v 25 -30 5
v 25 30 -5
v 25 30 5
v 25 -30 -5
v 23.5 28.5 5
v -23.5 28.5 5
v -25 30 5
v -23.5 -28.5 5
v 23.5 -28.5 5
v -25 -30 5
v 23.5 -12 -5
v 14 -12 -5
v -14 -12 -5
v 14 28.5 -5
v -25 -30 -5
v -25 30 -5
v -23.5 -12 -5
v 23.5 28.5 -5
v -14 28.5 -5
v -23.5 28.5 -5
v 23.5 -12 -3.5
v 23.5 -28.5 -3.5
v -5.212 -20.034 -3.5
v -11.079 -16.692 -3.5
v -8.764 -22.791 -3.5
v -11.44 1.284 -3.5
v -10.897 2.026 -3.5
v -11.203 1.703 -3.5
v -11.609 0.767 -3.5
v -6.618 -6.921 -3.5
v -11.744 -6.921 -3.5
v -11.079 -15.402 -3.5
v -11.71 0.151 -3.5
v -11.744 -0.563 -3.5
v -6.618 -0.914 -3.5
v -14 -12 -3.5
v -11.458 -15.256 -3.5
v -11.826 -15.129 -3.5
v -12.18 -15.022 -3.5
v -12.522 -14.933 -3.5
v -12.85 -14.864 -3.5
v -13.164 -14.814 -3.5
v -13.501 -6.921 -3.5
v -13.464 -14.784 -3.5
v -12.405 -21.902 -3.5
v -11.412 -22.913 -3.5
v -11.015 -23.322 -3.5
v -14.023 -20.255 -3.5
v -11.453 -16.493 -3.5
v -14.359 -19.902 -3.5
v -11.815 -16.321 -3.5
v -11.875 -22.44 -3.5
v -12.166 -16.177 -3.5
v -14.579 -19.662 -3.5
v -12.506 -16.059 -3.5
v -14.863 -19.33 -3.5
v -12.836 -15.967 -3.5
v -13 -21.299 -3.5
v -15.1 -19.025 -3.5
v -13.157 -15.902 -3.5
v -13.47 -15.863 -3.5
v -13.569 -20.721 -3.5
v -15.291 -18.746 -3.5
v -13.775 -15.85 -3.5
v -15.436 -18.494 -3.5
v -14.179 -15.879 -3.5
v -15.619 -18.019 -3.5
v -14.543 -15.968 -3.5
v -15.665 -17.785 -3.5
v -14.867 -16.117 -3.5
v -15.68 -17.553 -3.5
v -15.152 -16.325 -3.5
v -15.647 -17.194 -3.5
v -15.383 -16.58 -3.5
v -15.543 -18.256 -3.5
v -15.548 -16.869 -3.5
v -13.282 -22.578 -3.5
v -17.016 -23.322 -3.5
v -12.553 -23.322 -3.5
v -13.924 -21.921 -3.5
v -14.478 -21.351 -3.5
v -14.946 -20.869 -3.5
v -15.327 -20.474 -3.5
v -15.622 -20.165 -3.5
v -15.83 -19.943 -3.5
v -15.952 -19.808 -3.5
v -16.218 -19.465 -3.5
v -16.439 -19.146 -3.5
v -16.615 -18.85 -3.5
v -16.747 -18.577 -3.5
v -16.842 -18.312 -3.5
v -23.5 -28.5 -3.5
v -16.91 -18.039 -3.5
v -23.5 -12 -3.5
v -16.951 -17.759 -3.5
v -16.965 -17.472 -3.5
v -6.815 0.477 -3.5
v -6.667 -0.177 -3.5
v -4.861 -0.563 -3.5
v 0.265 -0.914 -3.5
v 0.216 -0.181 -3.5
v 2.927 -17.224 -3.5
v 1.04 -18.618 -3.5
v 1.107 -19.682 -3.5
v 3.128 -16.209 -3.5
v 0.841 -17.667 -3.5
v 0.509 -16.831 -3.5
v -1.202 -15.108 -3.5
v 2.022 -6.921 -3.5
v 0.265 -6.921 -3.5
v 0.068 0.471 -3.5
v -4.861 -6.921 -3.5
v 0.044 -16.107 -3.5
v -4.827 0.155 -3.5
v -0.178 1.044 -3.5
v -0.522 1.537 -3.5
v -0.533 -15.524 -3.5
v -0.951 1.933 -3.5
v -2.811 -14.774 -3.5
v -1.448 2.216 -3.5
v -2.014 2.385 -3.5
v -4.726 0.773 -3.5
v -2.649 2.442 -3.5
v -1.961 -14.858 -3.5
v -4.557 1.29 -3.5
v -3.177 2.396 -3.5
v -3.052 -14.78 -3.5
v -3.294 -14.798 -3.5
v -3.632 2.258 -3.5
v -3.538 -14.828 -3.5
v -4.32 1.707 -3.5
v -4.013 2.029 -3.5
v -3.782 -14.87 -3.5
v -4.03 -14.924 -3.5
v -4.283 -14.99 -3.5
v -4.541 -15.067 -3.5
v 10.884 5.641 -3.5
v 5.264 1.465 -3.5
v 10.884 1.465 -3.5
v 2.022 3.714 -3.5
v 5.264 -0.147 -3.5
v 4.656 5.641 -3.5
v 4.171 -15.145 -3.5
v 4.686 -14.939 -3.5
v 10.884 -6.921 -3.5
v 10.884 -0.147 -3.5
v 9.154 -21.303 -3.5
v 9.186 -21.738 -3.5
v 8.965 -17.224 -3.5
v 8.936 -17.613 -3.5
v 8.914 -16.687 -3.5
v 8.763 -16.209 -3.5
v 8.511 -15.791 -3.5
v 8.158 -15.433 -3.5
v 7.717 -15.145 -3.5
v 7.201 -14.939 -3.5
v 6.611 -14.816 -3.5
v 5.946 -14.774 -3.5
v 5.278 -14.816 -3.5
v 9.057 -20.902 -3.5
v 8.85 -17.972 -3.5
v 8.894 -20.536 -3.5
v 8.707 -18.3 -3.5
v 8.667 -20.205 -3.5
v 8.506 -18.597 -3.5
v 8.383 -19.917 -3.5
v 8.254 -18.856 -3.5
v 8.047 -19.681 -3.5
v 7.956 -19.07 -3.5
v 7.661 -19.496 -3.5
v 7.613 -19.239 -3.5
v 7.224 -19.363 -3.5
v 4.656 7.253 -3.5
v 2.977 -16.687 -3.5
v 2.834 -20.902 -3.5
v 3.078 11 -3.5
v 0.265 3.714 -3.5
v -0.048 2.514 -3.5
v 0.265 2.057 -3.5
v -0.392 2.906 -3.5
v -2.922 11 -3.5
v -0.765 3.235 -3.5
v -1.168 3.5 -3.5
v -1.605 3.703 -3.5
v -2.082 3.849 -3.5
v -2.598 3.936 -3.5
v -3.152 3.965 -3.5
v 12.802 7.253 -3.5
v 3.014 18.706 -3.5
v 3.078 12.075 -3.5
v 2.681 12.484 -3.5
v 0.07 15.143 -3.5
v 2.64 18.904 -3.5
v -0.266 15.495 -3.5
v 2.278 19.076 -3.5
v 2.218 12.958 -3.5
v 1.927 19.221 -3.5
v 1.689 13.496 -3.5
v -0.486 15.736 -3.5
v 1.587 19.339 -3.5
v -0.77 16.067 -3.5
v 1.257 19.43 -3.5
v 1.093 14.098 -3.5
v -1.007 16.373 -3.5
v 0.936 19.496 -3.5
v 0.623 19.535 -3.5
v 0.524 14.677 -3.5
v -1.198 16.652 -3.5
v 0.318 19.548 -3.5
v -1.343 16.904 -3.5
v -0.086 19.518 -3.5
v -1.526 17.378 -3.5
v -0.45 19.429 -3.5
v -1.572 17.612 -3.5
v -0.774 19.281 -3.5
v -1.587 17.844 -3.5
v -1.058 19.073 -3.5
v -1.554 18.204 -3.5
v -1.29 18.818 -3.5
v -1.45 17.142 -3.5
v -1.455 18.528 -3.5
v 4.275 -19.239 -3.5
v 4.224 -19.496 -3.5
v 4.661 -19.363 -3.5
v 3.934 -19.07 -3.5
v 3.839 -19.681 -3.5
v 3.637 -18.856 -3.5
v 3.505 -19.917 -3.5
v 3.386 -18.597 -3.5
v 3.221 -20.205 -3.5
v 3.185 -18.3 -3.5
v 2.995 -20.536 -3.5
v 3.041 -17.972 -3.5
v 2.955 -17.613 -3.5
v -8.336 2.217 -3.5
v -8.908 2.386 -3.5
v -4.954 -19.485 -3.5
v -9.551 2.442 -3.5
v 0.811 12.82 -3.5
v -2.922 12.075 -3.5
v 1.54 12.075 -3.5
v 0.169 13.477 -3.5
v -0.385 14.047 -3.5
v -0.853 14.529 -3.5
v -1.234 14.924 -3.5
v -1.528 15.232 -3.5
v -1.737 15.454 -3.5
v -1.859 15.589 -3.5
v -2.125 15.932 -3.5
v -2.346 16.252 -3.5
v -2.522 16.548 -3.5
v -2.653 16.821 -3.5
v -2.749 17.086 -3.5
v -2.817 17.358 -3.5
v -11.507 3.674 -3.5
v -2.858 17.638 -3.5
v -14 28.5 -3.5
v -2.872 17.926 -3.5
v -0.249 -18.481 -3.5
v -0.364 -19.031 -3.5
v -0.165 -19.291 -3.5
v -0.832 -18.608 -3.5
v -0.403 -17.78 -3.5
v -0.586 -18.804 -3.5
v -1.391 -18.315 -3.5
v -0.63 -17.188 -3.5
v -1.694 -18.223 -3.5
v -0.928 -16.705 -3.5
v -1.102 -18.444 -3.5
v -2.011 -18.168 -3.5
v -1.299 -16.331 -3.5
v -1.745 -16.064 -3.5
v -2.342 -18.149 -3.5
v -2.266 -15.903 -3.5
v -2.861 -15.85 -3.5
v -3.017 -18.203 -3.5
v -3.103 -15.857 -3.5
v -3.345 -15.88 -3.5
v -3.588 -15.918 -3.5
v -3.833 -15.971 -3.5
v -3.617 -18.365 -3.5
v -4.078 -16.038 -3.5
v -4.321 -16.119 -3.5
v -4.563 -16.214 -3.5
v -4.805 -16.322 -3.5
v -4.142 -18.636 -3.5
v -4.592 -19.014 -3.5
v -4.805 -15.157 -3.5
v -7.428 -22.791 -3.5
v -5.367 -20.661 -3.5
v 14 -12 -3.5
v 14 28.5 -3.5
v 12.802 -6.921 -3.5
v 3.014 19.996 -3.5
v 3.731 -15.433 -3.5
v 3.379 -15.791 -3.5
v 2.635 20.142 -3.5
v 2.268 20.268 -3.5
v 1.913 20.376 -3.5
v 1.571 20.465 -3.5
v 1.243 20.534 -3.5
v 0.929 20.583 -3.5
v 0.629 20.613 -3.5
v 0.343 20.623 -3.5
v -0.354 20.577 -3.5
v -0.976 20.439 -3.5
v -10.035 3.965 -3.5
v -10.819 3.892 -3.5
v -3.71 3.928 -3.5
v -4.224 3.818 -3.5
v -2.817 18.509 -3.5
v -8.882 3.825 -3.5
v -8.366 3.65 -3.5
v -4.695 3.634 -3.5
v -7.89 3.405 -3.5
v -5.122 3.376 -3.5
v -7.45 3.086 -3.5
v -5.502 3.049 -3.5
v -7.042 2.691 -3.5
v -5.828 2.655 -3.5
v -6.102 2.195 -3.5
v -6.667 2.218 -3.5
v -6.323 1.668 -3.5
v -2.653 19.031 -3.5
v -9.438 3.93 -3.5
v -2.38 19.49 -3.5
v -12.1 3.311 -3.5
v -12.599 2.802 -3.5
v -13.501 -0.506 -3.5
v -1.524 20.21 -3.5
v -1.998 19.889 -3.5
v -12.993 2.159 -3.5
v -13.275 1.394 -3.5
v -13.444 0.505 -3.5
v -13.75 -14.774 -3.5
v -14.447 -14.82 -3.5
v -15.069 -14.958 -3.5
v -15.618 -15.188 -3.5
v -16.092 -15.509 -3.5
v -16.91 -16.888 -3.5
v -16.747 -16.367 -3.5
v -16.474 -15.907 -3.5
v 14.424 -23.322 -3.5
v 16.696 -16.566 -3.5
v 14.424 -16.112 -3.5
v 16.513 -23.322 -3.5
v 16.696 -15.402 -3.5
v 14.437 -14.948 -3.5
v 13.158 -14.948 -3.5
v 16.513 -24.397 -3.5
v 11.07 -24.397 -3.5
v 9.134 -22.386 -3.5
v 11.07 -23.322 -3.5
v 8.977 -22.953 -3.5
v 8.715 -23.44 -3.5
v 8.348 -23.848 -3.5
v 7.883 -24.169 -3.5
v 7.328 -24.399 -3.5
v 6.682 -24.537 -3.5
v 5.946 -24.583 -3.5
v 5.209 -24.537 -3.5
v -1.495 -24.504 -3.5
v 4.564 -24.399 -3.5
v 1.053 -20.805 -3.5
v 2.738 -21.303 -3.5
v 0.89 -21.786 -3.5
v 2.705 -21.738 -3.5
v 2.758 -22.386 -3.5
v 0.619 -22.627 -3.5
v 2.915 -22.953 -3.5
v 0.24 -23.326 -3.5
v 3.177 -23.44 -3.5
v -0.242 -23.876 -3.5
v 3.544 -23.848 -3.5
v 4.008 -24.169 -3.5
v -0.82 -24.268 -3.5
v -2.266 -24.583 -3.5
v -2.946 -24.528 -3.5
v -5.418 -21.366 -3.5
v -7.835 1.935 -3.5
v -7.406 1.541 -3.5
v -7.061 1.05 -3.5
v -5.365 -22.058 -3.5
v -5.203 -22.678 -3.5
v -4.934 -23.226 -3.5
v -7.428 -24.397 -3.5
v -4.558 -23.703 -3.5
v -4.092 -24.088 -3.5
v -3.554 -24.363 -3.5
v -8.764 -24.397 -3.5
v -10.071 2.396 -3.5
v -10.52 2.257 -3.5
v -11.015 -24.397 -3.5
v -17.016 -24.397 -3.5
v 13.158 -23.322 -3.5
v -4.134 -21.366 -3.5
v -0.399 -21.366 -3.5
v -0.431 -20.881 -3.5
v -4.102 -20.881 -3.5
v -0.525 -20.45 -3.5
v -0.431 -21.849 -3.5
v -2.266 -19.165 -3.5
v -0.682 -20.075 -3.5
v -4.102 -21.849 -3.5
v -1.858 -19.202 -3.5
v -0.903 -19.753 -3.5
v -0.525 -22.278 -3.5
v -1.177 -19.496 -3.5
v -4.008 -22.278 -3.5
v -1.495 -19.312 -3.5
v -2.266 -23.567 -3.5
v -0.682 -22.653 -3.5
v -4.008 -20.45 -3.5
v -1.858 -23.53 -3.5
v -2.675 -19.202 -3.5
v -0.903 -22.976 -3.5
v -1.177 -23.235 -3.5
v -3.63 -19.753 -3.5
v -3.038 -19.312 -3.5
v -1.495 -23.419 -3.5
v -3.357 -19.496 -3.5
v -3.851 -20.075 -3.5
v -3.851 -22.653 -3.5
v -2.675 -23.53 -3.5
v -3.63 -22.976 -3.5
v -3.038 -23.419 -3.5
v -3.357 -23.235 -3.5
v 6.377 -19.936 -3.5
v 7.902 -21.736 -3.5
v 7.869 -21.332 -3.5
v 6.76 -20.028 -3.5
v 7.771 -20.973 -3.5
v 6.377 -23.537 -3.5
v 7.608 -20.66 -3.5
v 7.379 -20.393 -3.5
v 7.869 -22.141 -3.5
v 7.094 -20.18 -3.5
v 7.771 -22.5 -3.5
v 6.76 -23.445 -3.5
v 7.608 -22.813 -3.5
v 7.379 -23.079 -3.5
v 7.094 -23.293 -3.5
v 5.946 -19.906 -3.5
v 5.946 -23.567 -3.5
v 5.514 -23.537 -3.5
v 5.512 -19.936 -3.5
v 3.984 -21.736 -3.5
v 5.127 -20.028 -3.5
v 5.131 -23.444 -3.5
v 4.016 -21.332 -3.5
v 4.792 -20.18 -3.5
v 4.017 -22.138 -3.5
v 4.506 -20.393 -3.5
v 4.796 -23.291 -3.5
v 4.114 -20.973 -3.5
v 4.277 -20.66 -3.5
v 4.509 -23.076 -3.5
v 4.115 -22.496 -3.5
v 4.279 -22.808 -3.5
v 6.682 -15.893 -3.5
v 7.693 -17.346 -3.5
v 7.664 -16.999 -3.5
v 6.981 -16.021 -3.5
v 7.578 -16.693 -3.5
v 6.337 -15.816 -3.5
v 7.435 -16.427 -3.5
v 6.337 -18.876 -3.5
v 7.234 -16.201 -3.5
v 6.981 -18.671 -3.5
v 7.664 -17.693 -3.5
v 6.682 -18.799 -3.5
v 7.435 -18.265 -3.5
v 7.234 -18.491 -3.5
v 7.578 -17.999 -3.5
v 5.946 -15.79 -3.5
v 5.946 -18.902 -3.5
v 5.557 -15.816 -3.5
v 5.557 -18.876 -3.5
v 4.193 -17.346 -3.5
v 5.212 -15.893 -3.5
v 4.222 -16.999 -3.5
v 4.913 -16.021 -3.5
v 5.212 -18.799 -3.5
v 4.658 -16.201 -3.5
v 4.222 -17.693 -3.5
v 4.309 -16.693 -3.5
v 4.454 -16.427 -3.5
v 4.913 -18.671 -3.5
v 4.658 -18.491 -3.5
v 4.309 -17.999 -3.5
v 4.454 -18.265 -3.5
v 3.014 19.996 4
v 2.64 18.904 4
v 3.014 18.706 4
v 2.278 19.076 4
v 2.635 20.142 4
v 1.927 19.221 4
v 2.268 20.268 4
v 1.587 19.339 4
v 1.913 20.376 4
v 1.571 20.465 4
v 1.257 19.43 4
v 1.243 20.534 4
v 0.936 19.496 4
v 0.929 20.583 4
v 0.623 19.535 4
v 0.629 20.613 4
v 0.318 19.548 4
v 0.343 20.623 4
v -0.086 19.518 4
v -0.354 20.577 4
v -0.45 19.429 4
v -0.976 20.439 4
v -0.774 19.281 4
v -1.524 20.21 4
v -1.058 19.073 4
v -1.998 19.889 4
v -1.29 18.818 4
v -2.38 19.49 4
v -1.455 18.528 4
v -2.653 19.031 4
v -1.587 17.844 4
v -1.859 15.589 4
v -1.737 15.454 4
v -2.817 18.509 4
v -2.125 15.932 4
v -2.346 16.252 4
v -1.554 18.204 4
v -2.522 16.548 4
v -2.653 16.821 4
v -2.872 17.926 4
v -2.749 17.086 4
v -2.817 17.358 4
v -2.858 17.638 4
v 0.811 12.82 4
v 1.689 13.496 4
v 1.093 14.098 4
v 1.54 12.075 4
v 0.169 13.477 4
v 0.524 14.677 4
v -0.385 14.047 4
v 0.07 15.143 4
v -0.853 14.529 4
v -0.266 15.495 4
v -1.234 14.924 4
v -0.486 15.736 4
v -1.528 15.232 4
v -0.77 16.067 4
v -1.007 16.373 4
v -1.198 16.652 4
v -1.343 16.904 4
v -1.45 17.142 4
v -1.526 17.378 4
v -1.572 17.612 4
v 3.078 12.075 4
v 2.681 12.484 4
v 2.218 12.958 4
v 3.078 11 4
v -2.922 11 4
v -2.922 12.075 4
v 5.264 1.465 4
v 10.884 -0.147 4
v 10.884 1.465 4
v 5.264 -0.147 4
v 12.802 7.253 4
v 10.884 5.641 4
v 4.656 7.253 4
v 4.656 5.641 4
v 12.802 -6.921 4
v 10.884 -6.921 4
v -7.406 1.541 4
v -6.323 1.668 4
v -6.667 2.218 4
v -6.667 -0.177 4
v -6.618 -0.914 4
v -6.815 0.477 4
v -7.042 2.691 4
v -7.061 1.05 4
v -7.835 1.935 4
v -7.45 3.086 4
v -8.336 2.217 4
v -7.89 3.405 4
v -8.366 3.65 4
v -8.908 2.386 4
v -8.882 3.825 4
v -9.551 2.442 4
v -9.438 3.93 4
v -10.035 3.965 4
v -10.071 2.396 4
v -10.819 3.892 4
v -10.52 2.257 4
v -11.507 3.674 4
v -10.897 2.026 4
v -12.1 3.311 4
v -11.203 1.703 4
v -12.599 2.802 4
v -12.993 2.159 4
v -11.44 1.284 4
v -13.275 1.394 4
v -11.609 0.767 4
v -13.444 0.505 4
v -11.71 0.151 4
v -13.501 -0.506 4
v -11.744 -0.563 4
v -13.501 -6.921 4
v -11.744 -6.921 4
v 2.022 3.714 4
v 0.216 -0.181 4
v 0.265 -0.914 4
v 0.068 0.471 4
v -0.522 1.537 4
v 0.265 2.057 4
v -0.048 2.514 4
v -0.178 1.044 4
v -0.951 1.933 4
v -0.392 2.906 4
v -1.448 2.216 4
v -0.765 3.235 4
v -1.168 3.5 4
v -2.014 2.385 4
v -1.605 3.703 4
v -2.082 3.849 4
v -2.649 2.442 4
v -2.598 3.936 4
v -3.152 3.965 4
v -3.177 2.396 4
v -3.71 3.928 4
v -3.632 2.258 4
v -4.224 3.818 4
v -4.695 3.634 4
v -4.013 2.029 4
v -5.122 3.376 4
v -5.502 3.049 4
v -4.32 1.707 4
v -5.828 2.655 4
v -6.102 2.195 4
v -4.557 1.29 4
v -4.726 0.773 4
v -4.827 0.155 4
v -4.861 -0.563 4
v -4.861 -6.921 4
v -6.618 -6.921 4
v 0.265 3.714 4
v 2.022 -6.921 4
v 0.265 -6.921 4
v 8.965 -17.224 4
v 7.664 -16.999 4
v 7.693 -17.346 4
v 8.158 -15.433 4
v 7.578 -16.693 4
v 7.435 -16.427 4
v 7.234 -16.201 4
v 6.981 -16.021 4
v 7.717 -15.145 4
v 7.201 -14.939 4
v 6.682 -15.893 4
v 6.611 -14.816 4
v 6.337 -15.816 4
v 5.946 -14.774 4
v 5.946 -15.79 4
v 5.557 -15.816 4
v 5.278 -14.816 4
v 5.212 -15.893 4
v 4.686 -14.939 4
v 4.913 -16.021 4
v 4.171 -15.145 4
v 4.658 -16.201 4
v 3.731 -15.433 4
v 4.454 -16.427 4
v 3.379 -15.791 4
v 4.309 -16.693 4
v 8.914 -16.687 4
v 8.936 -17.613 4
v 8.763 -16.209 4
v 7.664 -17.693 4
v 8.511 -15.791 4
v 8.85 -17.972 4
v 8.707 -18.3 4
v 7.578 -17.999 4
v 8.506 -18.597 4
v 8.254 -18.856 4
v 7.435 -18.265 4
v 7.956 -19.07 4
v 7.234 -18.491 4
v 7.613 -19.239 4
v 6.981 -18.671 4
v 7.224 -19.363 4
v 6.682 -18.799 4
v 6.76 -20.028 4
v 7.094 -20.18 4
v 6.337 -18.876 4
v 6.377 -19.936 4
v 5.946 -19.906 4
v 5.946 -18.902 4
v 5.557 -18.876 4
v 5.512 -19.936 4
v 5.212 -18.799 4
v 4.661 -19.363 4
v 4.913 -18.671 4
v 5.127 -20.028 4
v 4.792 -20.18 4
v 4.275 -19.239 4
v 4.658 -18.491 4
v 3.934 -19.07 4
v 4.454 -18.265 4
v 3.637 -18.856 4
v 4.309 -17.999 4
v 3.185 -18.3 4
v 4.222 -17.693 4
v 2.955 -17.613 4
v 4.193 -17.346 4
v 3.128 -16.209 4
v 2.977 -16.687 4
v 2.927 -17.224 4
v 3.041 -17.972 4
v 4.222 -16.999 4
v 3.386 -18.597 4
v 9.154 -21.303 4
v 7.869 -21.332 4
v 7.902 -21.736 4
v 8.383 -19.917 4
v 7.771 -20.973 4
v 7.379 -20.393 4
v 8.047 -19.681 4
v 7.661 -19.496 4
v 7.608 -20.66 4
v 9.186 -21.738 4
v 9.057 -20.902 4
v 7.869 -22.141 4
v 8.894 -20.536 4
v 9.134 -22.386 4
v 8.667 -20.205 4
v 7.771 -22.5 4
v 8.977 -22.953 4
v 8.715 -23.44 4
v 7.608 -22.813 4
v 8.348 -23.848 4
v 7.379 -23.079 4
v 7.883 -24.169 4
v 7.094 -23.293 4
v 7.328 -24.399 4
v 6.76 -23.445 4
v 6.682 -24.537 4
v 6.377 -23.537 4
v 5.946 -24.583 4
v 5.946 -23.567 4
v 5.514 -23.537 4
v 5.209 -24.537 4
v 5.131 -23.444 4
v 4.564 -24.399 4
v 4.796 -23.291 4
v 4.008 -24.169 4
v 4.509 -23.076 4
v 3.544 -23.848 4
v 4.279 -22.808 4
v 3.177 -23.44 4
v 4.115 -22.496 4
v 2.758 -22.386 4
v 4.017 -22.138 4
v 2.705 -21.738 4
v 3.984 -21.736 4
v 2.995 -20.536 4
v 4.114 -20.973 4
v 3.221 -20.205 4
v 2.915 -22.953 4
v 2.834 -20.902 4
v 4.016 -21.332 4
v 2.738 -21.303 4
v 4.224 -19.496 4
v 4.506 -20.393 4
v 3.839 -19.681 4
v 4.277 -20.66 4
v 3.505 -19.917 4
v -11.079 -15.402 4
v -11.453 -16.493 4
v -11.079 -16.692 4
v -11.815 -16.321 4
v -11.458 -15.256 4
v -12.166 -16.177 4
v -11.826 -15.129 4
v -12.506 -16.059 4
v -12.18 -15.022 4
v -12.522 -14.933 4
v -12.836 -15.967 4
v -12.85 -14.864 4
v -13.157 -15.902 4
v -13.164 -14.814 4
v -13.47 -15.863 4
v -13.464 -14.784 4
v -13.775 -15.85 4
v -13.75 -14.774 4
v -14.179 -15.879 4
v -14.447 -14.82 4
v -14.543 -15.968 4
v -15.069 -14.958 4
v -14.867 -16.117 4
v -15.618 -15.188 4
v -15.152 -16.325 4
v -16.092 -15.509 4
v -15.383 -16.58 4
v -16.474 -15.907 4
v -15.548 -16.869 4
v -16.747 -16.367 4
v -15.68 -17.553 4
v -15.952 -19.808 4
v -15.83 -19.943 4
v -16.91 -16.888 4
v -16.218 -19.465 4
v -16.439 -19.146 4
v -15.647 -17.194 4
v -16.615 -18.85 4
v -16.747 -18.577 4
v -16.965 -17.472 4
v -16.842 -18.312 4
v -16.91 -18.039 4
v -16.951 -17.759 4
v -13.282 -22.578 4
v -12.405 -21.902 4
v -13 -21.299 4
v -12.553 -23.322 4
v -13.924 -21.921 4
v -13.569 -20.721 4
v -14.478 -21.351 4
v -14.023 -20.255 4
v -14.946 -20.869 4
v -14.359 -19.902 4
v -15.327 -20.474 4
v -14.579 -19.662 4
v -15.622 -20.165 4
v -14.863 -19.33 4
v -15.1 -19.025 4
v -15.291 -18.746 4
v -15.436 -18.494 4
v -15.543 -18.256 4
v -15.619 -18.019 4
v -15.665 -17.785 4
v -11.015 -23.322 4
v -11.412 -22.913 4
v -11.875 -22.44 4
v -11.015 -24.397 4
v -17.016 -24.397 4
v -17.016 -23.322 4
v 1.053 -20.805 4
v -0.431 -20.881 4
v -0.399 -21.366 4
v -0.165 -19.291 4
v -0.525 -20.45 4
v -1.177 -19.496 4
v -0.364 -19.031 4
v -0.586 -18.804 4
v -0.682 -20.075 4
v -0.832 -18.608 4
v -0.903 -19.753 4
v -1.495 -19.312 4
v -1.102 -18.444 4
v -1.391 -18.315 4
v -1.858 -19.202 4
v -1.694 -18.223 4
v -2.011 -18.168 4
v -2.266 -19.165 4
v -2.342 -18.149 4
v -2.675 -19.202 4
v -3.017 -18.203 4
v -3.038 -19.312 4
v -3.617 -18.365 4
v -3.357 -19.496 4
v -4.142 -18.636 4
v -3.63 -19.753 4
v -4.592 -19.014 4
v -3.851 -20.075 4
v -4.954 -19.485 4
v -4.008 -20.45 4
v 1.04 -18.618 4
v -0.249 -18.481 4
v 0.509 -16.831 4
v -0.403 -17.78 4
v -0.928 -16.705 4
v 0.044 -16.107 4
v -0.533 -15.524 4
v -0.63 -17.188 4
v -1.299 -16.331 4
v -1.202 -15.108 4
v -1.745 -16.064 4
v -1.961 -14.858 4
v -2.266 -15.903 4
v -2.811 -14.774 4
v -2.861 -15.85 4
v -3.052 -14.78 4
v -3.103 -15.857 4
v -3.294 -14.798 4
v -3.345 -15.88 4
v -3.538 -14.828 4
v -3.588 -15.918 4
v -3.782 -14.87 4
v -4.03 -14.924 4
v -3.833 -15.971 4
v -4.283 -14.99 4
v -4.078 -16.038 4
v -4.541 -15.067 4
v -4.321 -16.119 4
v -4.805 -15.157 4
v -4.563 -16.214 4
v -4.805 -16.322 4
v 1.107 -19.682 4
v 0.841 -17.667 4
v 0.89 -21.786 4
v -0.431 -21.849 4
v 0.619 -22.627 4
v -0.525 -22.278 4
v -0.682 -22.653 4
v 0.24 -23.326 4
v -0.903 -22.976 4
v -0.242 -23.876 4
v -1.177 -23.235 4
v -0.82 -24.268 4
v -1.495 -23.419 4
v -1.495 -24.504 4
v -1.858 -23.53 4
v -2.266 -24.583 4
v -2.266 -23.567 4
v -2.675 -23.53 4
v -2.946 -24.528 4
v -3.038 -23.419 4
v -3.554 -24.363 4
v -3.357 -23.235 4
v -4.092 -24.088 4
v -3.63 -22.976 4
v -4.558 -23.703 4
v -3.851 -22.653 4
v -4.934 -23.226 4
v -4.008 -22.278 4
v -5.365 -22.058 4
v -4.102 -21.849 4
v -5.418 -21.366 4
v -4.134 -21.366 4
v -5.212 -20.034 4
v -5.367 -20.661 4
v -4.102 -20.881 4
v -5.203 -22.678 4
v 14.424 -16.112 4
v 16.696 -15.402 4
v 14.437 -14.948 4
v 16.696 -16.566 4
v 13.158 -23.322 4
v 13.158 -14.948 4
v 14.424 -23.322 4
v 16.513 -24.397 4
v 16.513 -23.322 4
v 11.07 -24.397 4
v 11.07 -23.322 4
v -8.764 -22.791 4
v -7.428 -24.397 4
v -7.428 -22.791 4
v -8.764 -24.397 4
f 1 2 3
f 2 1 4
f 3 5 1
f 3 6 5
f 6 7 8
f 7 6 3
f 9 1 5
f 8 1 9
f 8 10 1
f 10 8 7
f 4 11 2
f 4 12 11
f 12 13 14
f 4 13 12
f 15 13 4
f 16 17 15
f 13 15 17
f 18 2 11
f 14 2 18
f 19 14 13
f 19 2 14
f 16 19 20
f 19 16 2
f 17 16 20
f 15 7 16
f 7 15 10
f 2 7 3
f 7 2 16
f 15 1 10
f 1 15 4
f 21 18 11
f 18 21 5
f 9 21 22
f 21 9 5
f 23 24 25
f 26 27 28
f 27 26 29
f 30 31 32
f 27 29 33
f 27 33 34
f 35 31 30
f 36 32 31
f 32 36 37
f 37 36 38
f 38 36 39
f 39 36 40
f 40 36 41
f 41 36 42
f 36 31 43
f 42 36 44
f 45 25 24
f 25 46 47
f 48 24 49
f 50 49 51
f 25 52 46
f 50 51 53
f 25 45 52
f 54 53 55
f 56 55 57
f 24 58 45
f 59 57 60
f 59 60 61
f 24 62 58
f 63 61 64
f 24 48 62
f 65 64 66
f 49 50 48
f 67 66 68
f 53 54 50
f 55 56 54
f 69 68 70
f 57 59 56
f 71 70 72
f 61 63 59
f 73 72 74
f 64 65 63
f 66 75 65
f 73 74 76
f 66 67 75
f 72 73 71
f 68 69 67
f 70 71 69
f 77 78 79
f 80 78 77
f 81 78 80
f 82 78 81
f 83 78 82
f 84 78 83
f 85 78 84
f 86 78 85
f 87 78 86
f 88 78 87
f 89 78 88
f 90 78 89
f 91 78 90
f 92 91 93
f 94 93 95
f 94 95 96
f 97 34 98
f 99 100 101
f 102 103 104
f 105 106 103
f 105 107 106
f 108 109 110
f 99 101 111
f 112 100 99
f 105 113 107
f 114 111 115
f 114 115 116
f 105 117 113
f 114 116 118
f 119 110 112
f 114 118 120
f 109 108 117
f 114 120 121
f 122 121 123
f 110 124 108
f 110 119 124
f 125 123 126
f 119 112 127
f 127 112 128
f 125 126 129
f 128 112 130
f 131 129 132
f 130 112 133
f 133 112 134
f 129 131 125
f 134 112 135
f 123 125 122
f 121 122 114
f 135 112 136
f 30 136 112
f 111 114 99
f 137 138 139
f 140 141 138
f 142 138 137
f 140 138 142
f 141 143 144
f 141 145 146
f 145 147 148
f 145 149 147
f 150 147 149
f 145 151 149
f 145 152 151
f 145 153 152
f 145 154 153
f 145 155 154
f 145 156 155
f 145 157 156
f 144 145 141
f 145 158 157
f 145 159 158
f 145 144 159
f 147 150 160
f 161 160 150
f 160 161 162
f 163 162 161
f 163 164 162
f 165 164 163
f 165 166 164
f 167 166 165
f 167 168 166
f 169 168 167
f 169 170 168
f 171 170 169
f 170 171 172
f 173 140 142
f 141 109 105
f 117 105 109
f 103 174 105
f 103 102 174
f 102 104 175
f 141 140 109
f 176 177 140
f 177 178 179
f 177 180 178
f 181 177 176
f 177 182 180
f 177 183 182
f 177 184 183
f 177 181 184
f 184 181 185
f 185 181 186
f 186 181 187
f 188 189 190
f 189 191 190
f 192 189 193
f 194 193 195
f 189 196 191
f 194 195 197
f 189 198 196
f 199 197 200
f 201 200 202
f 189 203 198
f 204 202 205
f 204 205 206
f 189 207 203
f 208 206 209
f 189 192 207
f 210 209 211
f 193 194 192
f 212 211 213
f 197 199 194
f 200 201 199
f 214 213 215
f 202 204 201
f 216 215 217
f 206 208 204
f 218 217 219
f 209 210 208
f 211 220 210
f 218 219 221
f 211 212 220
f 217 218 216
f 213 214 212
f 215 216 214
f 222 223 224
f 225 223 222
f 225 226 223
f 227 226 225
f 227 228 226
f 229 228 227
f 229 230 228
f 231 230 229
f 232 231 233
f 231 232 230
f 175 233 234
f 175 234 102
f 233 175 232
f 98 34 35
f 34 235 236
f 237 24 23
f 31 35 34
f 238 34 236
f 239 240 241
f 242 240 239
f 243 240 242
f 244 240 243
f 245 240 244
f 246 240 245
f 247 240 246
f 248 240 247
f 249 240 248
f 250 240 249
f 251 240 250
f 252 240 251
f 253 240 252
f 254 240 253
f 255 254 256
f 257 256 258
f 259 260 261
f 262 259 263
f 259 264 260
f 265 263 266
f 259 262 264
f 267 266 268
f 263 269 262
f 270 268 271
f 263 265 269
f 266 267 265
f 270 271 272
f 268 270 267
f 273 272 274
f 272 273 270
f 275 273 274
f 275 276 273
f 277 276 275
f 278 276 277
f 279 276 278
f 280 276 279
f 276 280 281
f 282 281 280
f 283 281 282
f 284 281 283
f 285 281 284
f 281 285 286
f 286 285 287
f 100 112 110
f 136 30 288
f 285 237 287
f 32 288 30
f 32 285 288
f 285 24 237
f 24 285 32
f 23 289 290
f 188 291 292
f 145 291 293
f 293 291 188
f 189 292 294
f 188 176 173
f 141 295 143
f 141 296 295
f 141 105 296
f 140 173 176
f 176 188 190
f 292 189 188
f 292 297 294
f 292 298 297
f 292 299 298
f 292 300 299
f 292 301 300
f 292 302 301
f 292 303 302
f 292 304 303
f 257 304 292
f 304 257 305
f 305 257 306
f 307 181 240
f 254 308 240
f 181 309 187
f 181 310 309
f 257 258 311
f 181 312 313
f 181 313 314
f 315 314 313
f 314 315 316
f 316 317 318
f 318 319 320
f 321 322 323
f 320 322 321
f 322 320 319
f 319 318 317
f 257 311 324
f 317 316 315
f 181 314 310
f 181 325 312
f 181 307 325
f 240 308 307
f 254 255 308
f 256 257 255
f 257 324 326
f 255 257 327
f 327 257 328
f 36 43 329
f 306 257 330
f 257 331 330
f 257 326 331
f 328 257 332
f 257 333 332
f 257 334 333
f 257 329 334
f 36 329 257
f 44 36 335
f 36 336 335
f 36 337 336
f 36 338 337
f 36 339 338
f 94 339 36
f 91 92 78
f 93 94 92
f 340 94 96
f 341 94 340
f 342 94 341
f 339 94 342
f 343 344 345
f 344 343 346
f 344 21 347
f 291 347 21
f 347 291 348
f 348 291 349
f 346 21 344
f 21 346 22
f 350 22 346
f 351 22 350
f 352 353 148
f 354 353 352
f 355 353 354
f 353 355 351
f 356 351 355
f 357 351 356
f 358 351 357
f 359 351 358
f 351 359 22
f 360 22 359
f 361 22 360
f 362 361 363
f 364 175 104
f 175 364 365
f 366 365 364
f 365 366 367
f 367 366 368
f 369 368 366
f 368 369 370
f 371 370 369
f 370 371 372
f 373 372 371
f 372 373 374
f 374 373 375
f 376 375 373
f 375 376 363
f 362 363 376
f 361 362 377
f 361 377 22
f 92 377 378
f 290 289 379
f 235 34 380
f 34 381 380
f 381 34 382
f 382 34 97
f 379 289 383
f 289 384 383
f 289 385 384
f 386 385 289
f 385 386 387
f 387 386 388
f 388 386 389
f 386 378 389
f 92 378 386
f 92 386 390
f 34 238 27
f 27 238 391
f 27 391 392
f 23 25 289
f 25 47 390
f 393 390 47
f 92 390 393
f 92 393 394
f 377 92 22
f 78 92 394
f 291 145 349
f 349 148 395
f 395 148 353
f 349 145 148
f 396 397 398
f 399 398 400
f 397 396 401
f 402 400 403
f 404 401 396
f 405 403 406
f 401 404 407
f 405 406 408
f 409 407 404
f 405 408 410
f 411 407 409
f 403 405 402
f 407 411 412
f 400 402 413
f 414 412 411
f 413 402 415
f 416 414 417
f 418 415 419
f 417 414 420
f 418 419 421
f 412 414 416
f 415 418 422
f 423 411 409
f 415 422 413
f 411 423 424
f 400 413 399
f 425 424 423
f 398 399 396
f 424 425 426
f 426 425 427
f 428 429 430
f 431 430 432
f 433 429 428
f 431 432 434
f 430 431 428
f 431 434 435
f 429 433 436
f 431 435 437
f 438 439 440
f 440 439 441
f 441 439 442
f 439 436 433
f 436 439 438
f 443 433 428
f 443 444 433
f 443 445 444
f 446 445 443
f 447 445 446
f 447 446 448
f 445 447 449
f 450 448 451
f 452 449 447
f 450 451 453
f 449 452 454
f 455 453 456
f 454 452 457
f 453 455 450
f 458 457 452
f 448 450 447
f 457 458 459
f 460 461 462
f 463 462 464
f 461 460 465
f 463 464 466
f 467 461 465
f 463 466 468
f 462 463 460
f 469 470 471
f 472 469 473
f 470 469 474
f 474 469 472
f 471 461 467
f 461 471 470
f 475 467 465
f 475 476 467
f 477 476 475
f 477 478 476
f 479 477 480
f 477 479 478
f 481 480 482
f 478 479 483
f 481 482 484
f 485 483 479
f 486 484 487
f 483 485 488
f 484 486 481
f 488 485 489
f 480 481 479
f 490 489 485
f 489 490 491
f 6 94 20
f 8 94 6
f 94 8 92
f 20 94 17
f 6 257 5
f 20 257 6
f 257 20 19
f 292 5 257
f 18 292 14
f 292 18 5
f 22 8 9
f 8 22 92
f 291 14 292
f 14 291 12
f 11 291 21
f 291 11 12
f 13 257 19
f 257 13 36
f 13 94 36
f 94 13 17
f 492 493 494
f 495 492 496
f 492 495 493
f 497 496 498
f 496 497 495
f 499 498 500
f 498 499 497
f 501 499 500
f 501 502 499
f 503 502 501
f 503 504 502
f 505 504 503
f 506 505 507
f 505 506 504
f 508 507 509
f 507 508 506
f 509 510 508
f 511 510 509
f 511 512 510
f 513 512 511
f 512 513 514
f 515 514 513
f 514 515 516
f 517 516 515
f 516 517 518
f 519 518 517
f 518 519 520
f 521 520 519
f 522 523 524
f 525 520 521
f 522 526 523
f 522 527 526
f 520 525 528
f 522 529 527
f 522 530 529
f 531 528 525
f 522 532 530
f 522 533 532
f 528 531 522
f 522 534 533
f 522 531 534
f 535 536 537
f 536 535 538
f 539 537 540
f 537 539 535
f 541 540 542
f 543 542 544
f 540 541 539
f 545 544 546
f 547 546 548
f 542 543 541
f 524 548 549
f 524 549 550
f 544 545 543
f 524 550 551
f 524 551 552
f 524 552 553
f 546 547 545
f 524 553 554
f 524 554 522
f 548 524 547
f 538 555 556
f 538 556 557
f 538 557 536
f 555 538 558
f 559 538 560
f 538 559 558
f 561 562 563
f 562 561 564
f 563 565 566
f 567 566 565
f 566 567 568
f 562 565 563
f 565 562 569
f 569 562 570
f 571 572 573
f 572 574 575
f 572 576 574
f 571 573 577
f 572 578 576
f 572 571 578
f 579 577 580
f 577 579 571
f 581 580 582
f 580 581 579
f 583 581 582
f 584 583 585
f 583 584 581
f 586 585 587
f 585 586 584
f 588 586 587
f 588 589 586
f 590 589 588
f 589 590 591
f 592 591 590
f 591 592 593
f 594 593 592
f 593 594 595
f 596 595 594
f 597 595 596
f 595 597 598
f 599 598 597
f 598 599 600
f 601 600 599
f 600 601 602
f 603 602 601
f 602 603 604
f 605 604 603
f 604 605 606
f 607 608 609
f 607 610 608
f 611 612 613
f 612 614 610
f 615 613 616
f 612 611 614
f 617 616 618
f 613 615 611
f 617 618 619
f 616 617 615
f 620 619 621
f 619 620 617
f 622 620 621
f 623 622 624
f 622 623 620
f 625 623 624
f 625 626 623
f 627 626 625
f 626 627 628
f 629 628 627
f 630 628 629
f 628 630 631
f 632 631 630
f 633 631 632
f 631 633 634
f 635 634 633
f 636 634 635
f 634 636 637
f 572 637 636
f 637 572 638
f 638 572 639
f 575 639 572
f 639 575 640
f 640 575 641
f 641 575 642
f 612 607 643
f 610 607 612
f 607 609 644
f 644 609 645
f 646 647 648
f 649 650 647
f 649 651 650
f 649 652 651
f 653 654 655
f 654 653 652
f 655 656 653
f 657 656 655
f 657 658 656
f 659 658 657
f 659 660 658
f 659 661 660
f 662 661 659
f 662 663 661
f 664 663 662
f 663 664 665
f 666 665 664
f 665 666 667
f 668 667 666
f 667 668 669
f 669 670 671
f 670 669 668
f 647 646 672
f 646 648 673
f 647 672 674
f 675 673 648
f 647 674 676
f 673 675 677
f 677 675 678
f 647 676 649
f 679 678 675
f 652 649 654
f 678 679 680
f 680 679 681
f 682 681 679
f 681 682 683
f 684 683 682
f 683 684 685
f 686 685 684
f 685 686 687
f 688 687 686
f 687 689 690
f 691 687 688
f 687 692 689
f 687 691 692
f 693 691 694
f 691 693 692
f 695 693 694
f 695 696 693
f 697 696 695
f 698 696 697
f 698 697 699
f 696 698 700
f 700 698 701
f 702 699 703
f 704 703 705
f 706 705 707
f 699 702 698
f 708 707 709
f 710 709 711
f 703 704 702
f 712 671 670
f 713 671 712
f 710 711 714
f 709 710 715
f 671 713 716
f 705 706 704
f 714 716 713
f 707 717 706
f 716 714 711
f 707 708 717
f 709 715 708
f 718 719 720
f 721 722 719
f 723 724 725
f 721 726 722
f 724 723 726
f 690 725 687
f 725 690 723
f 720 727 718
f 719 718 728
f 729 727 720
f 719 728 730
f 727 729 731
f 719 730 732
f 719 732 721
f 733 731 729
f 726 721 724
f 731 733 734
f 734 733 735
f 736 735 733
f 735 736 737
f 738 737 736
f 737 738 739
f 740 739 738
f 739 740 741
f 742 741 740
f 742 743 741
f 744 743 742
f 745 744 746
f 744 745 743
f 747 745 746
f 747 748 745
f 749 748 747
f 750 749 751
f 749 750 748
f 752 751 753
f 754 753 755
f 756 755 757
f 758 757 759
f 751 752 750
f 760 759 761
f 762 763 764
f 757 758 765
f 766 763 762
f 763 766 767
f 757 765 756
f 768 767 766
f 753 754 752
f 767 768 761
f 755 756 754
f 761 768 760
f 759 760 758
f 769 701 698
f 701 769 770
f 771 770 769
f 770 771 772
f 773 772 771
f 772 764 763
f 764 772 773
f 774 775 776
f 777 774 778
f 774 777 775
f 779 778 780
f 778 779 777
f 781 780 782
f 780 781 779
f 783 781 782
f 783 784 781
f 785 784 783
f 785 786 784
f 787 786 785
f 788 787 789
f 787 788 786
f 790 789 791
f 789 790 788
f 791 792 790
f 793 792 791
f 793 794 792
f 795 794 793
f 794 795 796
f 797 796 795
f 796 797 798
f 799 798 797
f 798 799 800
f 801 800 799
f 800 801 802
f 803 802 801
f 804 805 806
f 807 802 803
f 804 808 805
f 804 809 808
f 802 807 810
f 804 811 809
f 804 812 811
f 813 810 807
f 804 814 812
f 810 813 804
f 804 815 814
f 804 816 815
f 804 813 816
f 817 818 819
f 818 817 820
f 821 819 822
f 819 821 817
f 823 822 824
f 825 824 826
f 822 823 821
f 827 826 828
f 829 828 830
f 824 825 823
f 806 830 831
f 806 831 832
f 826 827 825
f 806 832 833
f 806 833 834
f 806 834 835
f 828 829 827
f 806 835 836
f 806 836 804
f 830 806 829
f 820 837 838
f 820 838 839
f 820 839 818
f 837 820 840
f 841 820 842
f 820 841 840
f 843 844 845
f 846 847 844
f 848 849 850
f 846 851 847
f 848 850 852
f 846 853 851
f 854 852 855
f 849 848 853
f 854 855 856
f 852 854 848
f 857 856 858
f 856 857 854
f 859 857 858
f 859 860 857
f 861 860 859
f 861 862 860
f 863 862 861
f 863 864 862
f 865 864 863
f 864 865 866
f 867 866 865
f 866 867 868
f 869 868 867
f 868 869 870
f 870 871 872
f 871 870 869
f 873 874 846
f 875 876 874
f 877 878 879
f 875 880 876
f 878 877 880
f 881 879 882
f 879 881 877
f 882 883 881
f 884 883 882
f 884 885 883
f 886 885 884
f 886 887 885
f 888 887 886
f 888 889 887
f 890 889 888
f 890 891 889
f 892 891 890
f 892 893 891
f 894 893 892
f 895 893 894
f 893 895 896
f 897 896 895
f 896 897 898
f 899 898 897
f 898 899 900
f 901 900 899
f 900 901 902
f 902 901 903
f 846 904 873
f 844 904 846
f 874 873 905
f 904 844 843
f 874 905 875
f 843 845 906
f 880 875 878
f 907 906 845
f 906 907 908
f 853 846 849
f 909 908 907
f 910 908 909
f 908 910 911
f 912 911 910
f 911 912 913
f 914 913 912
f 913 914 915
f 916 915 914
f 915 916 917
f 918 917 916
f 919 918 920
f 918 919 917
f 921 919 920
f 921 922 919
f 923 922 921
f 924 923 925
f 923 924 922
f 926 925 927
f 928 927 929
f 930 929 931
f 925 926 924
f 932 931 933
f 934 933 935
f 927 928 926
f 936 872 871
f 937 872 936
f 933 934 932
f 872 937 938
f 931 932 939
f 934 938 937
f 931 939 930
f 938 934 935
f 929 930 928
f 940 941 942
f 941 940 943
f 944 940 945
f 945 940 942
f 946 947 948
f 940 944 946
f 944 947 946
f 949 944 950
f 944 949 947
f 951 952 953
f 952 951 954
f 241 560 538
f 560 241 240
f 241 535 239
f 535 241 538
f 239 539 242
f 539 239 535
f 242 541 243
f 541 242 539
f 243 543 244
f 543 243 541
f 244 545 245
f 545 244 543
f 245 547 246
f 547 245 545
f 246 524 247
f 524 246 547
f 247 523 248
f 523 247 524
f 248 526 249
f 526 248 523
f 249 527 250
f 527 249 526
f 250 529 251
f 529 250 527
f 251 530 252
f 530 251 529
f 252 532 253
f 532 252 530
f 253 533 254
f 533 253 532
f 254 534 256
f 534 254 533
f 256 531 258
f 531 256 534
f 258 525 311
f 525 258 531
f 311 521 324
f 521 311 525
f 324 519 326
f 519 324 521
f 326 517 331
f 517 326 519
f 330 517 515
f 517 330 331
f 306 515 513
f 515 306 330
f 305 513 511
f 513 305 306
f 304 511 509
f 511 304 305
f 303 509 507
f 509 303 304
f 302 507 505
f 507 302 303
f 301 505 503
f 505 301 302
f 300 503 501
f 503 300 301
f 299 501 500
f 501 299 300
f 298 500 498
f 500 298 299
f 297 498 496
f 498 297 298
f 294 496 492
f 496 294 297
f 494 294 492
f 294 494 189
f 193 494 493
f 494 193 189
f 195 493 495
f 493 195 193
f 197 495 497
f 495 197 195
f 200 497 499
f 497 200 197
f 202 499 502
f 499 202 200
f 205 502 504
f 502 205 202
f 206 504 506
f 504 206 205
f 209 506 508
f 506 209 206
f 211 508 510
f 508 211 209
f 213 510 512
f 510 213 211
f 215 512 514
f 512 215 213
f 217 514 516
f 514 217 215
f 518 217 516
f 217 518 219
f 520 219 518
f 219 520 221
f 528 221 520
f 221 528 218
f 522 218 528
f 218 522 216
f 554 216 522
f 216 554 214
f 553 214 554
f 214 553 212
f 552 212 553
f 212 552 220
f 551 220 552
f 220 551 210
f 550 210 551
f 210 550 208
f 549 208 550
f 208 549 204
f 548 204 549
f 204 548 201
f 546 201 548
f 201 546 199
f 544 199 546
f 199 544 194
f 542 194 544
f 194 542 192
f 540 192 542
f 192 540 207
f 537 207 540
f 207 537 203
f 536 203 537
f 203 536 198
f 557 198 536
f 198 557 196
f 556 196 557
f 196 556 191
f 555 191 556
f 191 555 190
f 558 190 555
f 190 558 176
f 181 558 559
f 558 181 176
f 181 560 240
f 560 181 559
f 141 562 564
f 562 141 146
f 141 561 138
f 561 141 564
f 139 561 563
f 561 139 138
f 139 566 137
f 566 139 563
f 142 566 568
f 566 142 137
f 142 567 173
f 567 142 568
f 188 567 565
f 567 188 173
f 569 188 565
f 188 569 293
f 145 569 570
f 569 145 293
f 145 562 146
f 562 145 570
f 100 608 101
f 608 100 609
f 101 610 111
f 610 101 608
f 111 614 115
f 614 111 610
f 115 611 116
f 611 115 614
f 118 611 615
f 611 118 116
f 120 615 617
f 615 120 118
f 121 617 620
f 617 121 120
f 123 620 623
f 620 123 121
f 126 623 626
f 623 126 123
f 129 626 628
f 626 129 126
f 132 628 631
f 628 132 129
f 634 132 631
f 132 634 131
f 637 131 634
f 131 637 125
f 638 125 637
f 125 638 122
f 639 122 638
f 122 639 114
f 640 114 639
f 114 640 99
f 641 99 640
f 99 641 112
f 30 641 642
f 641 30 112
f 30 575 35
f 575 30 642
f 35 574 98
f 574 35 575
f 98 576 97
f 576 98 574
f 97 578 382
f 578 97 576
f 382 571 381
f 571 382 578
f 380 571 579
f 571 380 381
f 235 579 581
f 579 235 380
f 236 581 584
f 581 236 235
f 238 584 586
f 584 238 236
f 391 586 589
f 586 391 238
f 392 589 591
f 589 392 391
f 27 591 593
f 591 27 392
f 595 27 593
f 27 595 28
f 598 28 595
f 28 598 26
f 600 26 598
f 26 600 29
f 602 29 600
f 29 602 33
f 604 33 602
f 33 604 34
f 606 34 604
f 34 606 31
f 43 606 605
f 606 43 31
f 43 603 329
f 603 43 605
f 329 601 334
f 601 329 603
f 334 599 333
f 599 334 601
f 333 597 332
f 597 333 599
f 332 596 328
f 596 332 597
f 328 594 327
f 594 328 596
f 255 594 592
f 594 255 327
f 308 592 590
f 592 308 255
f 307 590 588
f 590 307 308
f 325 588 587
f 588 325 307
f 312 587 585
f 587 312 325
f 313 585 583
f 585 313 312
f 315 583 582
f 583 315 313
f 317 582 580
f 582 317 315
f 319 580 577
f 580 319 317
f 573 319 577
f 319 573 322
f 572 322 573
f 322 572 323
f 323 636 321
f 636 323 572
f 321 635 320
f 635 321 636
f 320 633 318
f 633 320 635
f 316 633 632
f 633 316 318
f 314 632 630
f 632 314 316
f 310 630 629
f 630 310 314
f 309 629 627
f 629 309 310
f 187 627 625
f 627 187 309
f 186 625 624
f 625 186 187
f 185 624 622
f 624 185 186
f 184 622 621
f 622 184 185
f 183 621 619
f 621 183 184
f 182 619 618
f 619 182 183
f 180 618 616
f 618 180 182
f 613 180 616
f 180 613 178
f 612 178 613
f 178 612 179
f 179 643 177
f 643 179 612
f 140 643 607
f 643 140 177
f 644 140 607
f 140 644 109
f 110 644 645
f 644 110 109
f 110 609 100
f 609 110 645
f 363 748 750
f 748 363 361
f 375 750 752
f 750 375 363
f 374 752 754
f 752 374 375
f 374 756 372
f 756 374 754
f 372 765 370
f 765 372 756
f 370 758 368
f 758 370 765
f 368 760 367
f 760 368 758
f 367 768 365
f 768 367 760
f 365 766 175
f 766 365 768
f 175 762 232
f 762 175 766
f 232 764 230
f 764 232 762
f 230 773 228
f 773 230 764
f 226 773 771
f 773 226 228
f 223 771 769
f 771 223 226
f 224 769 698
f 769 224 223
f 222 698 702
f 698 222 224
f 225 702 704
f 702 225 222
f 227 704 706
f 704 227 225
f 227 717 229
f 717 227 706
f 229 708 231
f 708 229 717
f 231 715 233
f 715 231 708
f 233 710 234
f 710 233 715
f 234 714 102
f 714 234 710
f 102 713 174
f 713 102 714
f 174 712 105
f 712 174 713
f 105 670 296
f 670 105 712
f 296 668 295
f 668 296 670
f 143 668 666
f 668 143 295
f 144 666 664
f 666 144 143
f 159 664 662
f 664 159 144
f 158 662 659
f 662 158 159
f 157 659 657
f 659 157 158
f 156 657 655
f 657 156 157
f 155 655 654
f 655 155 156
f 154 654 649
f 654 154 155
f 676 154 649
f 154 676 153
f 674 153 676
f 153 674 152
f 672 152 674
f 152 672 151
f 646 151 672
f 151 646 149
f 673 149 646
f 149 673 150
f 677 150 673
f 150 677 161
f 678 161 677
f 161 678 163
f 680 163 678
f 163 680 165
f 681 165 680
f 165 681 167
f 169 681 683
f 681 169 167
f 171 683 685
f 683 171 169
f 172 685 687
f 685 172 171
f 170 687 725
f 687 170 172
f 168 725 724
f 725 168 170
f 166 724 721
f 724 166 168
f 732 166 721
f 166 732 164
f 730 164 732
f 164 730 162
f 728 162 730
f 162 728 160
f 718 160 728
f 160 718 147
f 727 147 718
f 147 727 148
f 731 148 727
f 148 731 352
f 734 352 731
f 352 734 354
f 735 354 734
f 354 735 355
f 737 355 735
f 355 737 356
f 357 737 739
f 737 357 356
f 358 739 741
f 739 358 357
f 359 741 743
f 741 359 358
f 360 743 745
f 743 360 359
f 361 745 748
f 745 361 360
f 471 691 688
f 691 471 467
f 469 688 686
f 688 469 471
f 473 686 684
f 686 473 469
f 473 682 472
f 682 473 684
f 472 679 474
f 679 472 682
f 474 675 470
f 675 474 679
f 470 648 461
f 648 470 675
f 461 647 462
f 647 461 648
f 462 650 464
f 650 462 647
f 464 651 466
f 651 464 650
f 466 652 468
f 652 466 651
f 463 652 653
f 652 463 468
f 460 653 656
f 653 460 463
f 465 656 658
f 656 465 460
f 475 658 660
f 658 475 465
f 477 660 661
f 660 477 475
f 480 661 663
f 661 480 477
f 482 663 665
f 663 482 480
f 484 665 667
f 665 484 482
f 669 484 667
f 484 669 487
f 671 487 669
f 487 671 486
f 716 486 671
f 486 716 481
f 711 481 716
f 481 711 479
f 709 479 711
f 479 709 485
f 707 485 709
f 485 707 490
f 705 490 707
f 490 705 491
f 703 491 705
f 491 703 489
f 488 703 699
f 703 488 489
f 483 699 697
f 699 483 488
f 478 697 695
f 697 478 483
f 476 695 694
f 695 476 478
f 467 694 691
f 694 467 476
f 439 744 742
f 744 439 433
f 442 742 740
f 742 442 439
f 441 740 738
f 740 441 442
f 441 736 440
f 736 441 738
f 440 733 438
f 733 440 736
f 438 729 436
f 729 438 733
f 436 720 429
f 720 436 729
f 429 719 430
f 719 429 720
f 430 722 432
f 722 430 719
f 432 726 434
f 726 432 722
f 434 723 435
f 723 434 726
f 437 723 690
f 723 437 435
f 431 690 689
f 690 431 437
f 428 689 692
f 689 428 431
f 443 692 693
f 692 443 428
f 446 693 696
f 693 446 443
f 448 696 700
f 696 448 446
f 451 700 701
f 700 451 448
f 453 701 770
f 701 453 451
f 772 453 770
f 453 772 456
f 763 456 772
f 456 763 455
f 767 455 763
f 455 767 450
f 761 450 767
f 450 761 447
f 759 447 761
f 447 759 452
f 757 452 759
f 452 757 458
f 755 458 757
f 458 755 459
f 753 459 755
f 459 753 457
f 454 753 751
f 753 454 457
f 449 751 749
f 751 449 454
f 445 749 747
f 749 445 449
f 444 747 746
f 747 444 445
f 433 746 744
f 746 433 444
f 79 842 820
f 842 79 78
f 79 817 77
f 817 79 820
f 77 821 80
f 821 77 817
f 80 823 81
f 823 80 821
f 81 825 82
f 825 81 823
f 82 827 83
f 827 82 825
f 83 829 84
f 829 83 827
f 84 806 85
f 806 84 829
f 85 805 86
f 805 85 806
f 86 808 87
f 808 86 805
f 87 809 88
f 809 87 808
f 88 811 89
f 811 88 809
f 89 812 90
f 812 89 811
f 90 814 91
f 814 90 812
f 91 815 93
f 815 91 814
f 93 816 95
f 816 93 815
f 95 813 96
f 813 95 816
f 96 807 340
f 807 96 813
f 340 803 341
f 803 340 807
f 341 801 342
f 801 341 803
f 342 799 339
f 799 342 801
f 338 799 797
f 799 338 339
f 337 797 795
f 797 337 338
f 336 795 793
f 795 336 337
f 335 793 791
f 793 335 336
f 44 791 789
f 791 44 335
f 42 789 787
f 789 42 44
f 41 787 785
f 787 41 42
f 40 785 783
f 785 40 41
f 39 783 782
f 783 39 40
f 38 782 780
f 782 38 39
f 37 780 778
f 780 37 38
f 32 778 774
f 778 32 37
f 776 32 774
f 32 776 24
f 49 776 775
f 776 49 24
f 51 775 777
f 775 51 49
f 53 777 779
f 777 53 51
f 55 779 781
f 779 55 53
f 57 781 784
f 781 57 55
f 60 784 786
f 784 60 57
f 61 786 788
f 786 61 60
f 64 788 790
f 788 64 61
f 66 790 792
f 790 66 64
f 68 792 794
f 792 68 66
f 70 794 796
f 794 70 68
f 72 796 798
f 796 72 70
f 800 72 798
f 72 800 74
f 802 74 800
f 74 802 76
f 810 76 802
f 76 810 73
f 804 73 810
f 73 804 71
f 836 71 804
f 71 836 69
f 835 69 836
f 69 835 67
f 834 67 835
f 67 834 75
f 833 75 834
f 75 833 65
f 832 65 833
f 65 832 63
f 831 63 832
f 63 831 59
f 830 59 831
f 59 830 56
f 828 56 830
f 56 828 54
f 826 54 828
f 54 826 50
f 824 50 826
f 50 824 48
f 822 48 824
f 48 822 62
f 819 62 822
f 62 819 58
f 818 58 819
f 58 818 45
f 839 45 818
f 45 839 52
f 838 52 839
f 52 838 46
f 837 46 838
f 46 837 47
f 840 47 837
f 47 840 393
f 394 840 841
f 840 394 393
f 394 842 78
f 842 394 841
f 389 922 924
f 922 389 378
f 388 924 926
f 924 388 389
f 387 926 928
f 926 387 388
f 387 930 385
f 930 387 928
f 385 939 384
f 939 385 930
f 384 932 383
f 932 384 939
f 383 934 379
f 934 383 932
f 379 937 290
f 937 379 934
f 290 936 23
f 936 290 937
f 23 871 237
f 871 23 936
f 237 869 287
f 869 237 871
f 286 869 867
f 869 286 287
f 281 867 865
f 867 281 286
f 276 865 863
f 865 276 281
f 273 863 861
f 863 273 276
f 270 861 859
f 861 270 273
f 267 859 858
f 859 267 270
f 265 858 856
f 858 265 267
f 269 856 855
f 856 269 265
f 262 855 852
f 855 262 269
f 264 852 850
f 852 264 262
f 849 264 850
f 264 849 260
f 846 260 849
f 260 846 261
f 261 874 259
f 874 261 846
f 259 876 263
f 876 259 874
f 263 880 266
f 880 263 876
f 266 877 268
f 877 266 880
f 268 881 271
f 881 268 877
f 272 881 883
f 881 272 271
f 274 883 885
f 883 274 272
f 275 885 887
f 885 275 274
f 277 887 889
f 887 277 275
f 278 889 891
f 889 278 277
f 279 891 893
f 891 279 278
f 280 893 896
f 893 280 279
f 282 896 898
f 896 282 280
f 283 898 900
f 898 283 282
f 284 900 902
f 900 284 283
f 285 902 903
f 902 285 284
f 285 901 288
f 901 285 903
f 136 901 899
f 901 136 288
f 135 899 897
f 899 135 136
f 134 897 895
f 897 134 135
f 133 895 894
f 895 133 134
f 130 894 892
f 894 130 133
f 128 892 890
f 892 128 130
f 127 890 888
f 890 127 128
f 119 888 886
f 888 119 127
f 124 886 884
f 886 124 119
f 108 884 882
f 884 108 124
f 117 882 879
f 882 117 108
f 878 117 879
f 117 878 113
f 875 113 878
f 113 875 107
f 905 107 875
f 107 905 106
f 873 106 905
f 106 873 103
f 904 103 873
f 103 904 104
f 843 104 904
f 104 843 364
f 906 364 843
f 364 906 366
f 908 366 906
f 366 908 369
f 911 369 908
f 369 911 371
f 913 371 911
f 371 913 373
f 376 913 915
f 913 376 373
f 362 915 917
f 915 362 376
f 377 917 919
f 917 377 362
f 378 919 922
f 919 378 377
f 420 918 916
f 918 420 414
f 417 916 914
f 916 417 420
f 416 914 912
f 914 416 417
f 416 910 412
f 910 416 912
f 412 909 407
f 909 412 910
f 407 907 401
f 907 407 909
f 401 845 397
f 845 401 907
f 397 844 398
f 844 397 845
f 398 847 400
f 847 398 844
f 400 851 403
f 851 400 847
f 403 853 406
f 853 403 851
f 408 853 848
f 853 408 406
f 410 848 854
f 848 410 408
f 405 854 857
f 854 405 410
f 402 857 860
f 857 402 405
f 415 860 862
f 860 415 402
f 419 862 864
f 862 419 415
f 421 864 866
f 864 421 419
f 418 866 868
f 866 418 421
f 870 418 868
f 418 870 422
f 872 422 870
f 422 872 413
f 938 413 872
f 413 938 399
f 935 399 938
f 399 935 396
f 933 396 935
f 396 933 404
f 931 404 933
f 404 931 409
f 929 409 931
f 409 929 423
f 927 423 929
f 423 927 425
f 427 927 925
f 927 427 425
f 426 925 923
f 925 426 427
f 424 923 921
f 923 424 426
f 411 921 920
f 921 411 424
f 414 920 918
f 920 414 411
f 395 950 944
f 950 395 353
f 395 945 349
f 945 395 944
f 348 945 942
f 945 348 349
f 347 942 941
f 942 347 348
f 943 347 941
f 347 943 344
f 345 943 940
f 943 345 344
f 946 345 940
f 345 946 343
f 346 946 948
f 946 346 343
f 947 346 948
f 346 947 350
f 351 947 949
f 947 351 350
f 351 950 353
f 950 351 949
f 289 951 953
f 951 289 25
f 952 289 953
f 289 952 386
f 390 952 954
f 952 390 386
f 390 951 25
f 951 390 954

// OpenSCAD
l = 50;
b = 60;
h = 10;

lc = 47; //cut out area in length and breith and depth;)
bc = 57;
hc = 9;

//define cutout in x-direction
c = 14;
f = 5; // additional cutout in y-direction negative from lower part of element text

d = 15; // length between the element name and the atomic number and atomic weight

size = 14;
small_size = 2/3 * size;

atomicnum = "2";
element = "Fm";
atomicwght = "186.2";

font = "Roboto Bold";

lbh = [l, b, h];

difference() {
    difference() {
        cube(lbh, center = true);
            translate([0,0,h-hc]) {
            cube([lc,bc,hc], center = true);
        }
        translate([c,0-size/2 -f,-6])    
            cube([(lc/2)-c, (bc/2) +size/2 +f, 11]);
        
    mirror([-1,0,0]){
            translate([c,0-size/2 -f ,-6])    
            cube([(lc/2)-c, (bc/2) +size/2 +f, 11]);
    }
    
}
}


translate([0,0,-4]) { //writing on the backside
    mirror([-1,0,0]){
    linear_extrude(8){
            translate([0,d-4,0]) {
                text(atomicnum, font = font, size = small_size, halign = "center");
            }

            text(element, font = font, size = size, halign = "center", valign = "center");

            translate([0,-d,0]) {
                text(atomicwght, font = font, size = small_size,  halign = "center", valign = "top");
            }
        }
    }
}
